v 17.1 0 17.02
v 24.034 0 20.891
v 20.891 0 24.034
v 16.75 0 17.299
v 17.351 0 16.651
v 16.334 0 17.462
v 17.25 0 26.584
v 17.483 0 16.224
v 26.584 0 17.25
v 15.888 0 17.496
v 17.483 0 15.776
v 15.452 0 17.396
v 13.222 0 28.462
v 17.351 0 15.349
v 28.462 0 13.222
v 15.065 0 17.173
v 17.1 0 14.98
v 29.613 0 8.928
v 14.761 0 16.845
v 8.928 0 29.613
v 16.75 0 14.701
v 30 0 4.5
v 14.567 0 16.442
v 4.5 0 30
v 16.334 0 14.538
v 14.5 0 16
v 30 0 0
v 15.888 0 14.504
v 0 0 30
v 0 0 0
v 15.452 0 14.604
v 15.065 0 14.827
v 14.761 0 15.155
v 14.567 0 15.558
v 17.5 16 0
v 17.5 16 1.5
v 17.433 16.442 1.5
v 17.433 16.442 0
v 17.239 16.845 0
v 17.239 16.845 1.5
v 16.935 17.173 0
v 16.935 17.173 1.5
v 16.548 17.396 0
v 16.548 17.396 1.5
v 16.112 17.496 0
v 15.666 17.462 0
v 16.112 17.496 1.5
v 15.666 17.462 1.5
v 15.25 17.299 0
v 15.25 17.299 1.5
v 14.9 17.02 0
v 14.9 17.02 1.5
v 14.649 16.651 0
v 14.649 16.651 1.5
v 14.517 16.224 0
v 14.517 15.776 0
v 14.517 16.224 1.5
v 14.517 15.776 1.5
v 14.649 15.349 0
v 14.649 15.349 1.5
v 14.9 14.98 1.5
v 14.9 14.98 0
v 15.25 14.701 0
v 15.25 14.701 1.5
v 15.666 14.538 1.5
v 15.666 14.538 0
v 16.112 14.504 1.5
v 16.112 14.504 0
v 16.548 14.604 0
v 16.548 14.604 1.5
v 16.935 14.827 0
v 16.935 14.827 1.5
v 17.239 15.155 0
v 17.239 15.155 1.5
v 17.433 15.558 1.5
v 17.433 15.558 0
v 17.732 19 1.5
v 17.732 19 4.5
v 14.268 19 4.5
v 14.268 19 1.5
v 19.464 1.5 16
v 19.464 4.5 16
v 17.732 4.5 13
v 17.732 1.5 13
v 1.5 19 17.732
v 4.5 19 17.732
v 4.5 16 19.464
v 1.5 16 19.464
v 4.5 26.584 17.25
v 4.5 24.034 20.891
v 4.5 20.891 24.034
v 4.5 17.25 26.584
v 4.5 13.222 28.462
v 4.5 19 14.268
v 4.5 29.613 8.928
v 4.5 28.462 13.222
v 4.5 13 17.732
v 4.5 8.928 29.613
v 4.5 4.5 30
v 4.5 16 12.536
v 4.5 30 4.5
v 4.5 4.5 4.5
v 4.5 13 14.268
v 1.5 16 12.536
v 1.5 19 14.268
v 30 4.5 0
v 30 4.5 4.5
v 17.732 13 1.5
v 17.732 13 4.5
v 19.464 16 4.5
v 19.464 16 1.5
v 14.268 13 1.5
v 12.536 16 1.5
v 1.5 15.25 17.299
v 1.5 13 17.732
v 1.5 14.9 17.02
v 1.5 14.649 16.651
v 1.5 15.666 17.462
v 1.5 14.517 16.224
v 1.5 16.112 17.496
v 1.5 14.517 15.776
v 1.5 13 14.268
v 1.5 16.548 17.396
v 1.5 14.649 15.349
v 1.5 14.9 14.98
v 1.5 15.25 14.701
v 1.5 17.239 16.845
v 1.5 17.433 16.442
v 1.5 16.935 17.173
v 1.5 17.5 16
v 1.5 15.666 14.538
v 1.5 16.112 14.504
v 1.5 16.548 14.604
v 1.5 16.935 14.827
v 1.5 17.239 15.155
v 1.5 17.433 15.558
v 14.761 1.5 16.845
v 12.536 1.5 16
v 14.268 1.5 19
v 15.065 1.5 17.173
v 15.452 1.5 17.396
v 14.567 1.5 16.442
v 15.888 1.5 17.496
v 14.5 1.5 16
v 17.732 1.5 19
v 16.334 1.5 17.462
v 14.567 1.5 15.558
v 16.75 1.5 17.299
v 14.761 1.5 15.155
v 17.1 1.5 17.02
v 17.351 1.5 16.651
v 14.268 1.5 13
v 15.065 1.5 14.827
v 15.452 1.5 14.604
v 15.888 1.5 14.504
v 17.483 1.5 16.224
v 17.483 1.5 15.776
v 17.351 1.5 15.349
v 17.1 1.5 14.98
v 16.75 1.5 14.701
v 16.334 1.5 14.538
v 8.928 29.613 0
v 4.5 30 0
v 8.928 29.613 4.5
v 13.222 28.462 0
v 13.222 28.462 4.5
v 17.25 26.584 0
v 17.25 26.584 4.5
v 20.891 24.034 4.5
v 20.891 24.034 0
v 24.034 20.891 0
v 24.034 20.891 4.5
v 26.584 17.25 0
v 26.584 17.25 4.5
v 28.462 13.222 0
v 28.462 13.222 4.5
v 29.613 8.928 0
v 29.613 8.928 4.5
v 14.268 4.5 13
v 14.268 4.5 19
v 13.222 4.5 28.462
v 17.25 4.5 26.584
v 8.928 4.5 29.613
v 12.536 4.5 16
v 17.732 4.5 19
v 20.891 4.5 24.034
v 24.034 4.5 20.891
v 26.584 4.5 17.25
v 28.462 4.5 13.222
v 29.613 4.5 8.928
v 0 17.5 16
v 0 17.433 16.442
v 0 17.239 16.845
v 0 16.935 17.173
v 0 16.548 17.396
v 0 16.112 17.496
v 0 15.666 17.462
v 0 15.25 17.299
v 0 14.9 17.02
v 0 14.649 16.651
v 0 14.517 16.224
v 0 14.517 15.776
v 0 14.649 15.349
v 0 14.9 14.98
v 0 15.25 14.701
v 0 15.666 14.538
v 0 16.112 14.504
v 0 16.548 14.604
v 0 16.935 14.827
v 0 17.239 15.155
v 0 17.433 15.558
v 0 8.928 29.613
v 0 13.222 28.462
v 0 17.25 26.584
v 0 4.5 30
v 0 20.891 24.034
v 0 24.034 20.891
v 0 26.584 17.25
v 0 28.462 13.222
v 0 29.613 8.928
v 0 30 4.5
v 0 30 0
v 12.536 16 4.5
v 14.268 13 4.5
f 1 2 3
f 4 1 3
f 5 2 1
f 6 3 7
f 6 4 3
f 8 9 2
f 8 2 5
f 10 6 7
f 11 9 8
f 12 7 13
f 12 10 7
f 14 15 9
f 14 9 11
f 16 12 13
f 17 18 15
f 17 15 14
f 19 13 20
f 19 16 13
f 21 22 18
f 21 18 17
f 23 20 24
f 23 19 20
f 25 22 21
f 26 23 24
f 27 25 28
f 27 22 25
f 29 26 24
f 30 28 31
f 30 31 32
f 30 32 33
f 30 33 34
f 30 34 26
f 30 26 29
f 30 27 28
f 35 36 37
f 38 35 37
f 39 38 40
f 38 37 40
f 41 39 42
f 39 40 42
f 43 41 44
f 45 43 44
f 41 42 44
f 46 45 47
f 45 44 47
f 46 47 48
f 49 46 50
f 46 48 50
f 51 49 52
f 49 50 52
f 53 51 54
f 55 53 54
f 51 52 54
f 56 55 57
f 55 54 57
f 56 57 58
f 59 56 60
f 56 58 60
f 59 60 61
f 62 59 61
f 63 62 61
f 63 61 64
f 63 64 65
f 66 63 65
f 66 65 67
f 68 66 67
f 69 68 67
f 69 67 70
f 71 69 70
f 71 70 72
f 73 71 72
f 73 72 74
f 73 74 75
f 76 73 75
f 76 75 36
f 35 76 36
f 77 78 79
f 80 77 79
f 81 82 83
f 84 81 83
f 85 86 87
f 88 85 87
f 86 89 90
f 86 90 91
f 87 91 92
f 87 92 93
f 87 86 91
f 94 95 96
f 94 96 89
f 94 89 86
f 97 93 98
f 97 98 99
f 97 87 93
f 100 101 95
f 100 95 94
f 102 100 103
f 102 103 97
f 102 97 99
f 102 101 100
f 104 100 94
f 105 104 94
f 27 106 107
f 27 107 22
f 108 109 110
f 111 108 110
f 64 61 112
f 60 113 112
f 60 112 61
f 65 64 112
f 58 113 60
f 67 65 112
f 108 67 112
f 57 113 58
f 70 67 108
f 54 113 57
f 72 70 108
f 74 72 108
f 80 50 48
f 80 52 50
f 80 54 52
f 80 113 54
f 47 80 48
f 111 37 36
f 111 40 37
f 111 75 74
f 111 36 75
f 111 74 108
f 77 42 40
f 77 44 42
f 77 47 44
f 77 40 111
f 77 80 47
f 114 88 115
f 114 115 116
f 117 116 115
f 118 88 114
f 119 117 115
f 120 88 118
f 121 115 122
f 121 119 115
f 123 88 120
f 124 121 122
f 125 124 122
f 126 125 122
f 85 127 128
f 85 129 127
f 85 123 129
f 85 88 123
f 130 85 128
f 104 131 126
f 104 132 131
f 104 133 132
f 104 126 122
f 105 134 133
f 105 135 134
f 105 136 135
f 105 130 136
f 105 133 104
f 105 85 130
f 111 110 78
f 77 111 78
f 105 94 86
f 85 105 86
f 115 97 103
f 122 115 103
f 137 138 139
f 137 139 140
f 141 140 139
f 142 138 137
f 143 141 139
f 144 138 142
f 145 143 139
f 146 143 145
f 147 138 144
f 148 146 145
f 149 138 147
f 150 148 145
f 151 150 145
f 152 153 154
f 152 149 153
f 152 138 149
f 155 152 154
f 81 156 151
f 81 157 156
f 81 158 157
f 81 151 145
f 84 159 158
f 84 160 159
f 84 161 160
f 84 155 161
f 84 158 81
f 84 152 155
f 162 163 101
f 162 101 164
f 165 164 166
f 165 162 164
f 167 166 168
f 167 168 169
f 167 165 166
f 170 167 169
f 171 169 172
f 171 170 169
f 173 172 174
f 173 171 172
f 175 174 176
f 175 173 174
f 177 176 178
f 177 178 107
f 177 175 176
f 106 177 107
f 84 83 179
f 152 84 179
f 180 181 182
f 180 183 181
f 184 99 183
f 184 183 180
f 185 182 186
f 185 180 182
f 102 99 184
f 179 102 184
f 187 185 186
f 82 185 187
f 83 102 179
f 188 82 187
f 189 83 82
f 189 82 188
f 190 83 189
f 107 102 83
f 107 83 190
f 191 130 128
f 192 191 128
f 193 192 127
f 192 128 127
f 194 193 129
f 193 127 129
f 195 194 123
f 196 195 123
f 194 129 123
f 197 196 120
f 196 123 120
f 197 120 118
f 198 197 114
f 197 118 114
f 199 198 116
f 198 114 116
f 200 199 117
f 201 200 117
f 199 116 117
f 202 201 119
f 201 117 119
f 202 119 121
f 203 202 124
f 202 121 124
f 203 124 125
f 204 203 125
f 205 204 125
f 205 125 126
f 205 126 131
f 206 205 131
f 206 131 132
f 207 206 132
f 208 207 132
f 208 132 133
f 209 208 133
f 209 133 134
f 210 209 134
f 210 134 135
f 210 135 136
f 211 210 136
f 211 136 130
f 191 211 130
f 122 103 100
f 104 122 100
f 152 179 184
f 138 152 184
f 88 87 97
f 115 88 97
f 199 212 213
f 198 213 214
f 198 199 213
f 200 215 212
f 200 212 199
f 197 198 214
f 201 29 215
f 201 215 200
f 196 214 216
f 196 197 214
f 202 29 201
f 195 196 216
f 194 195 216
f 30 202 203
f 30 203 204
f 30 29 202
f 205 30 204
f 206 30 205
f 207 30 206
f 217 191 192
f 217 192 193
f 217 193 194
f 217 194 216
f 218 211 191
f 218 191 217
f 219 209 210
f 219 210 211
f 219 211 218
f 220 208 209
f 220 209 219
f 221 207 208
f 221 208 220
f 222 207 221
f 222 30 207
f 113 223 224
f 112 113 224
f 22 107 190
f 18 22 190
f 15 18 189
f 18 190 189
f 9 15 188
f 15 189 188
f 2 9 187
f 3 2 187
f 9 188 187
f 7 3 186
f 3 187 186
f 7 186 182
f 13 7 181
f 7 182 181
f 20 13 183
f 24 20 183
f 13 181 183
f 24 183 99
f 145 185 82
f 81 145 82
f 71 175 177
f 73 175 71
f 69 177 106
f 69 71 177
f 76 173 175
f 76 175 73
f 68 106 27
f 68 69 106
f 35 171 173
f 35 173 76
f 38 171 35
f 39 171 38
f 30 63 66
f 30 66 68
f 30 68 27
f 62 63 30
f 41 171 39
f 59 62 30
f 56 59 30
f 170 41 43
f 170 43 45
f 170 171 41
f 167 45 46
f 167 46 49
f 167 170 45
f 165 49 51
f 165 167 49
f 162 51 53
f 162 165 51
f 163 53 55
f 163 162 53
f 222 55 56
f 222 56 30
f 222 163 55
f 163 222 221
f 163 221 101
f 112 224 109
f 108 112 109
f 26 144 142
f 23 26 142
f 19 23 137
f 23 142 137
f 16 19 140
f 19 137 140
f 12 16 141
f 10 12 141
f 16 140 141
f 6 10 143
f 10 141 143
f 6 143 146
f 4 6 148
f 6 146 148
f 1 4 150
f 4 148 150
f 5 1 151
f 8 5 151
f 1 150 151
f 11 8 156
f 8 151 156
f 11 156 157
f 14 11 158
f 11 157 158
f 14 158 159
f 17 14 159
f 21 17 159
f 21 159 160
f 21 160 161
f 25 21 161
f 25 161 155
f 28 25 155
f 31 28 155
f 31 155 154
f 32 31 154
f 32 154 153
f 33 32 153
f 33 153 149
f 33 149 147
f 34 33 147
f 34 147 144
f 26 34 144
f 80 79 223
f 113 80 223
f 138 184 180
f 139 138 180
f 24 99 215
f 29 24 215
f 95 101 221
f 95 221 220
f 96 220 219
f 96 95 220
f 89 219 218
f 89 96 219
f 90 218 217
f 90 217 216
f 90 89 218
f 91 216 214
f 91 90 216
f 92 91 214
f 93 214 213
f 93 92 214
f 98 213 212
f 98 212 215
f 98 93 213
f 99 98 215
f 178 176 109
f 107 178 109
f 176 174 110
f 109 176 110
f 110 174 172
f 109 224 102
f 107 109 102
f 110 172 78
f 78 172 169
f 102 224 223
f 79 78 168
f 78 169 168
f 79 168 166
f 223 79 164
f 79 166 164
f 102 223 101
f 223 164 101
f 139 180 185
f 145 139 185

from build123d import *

# Parameters (mm, degrees)
BOSS_EXTRUDE3_DEPTH = 30
BOSS_EXTRUDE4_DEPTH = 4.5
CUT_EXTRUDE3_DEPTH  = 4.5
CUT_EXTRUDE4_DEPTH  = 4.5
SKETCH9_R           = 1.5
CUT_EXTRUDE5_DEPTH  = 4.5
CUT_EXTRUDE6_DEPTH  = 3
SKETCH12_R          = 1.5
CUT_EXTRUDE8_DEPTH  = 50.5
CUT_EXTRUDE9_DEPTH  = 3
SKETCH14_R          = 1.5
CUT_EXTRUDE10_DEPTH = 50.5
CUT_EXTRUDE11_DEPTH = 3


with BuildPart() as part:
    # Sketch1 → Boss-Extrude3 (new body)
    with BuildSketch(Plane.XY):
        Polygon((0, 0), (0, 30), (4.5, 30), (4.5, 4.5), (30, 4.5), (30, 0), align=None)
    extrude(amount=BOSS_EXTRUDE3_DEPTH)

    # Sketch6 → Boss-Extrude4 (add)
    with BuildSketch(Plane(origin=(0, 0, 0), x_dir=(-1, 0, 0), z_dir=(0, 0, -1))):
        with BuildLine():
            Line((0, 0), (0, 30))
            Line((0, 30), (-4.5, 30))
            ThreePointArc((-4.5, 30), (-22.53122292, 22.53122292), (-30, 4.5))
            Line((-30, 4.5), (-30, 0))
            Line((-30, 0), (0, 0))
        make_face()
    extrude(amount=-BOSS_EXTRUDE4_DEPTH)

    # Sketch7 → Cut-Extrude3 (cut)
    with BuildSketch(Plane(origin=(4.5, 0, 0), x_dir=(0, 0, -1), z_dir=(1, 0, 0))):
        with BuildLine():
            Line((-30, 4.5), (-56.330793143, 4.5))
            Line((-56.330793143, 4.5), (-56.330793143, 46.447924187))
            Line((-56.330793143, 46.447924187), (-4.5, 46.447924187))
            Line((-4.5, 46.447924187), (-4.5, 30))
            ThreePointArc((-4.5, 30), (-22.53122292, 22.53122292), (-30, 4.5))
        make_face()
    extrude(amount=-CUT_EXTRUDE3_DEPTH, mode=Mode.SUBTRACT)

    # Sketch8 → Cut-Extrude4 (cut)
    with BuildSketch(Plane(origin=(0, 4.5, 0), x_dir=(1, 0, 0), z_dir=(0, 1, 0))):
        with BuildLine():
            Line((4.5, -30), (4.5, -32.471065144))
            Line((4.5, -32.471065144), (33.329643203, -32.471065144))
            Line((33.329643203, -32.471065144), (33.329643203, -4.5))
            Line((33.329643203, -4.5), (30, -4.5))
            ThreePointArc((30, -4.5), (22.53122292, -22.53122292), (4.5, -30))
        make_face()
    extrude(amount=-CUT_EXTRUDE4_DEPTH, mode=Mode.SUBTRACT)

    # Sketch9 → Cut-Extrude5 (cut)
    with BuildSketch(Plane.XY.offset(4.5)):
        with Locations((16, 16)):
            Circle(SKETCH9_R)
    extrude(amount=-CUT_EXTRUDE5_DEPTH, mode=Mode.SUBTRACT)

    # Sketch10 → Cut-Extrude6 (cut)
    with BuildSketch(Plane.XY.offset(4.5)):
        Polygon((19.464101615, 16), (17.732050808, 19), (14.267949192, 19), (12.535898385, 16), (14.267949192, 13), (17.732050808, 13), align=None)
    extrude(amount=-CUT_EXTRUDE6_DEPTH, mode=Mode.SUBTRACT)

    # Sketch12 → Cut-Extrude8 (cut, through all)
    with BuildSketch(Plane(origin=(0, 4.5, 0), x_dir=(1, 0, 0), z_dir=(0, 1, 0))):
        with Locations(Location((16, -16, 0), (0, 0, 180))):
            Circle(SKETCH12_R)
    extrude(amount=-CUT_EXTRUDE8_DEPTH, mode=Mode.SUBTRACT)

    # Sketch13 → Cut-Extrude9 (cut)
    with BuildSketch(Plane(origin=(0, 4.5, 0), x_dir=(1, 0, 0), z_dir=(0, 1, 0))):
        Polygon((19.464101615, -16), (17.732050808, -13), (14.267949192, -13), (12.535898385, -16), (14.267949192, -19), (17.732050808, -19), align=None)
    extrude(amount=-CUT_EXTRUDE9_DEPTH, mode=Mode.SUBTRACT)

    # Sketch14 → Cut-Extrude10 (cut, through all)
    with BuildSketch(Plane(origin=(4.5, 0, 0), x_dir=(0, 0, -1), z_dir=(1, 0, 0))):
        with Locations(Location((-16, 16, 0), (0, 0, 90))):
            Circle(SKETCH14_R)
    extrude(amount=-CUT_EXTRUDE10_DEPTH, mode=Mode.SUBTRACT)

    # Sketch15 → Cut-Extrude11 (cut)
    with BuildSketch(Plane(origin=(4.5, 0, 0), x_dir=(0, 0, -1), z_dir=(1, 0, 0))):
        Polygon((-19.464101615, 16), (-17.732050808, 13), (-14.267949192, 13), (-12.535898385, 16), (-14.267949192, 19), (-17.732050808, 19), align=None)
    extrude(amount=-CUT_EXTRUDE11_DEPTH, mode=Mode.SUBTRACT)


solid = part.part
